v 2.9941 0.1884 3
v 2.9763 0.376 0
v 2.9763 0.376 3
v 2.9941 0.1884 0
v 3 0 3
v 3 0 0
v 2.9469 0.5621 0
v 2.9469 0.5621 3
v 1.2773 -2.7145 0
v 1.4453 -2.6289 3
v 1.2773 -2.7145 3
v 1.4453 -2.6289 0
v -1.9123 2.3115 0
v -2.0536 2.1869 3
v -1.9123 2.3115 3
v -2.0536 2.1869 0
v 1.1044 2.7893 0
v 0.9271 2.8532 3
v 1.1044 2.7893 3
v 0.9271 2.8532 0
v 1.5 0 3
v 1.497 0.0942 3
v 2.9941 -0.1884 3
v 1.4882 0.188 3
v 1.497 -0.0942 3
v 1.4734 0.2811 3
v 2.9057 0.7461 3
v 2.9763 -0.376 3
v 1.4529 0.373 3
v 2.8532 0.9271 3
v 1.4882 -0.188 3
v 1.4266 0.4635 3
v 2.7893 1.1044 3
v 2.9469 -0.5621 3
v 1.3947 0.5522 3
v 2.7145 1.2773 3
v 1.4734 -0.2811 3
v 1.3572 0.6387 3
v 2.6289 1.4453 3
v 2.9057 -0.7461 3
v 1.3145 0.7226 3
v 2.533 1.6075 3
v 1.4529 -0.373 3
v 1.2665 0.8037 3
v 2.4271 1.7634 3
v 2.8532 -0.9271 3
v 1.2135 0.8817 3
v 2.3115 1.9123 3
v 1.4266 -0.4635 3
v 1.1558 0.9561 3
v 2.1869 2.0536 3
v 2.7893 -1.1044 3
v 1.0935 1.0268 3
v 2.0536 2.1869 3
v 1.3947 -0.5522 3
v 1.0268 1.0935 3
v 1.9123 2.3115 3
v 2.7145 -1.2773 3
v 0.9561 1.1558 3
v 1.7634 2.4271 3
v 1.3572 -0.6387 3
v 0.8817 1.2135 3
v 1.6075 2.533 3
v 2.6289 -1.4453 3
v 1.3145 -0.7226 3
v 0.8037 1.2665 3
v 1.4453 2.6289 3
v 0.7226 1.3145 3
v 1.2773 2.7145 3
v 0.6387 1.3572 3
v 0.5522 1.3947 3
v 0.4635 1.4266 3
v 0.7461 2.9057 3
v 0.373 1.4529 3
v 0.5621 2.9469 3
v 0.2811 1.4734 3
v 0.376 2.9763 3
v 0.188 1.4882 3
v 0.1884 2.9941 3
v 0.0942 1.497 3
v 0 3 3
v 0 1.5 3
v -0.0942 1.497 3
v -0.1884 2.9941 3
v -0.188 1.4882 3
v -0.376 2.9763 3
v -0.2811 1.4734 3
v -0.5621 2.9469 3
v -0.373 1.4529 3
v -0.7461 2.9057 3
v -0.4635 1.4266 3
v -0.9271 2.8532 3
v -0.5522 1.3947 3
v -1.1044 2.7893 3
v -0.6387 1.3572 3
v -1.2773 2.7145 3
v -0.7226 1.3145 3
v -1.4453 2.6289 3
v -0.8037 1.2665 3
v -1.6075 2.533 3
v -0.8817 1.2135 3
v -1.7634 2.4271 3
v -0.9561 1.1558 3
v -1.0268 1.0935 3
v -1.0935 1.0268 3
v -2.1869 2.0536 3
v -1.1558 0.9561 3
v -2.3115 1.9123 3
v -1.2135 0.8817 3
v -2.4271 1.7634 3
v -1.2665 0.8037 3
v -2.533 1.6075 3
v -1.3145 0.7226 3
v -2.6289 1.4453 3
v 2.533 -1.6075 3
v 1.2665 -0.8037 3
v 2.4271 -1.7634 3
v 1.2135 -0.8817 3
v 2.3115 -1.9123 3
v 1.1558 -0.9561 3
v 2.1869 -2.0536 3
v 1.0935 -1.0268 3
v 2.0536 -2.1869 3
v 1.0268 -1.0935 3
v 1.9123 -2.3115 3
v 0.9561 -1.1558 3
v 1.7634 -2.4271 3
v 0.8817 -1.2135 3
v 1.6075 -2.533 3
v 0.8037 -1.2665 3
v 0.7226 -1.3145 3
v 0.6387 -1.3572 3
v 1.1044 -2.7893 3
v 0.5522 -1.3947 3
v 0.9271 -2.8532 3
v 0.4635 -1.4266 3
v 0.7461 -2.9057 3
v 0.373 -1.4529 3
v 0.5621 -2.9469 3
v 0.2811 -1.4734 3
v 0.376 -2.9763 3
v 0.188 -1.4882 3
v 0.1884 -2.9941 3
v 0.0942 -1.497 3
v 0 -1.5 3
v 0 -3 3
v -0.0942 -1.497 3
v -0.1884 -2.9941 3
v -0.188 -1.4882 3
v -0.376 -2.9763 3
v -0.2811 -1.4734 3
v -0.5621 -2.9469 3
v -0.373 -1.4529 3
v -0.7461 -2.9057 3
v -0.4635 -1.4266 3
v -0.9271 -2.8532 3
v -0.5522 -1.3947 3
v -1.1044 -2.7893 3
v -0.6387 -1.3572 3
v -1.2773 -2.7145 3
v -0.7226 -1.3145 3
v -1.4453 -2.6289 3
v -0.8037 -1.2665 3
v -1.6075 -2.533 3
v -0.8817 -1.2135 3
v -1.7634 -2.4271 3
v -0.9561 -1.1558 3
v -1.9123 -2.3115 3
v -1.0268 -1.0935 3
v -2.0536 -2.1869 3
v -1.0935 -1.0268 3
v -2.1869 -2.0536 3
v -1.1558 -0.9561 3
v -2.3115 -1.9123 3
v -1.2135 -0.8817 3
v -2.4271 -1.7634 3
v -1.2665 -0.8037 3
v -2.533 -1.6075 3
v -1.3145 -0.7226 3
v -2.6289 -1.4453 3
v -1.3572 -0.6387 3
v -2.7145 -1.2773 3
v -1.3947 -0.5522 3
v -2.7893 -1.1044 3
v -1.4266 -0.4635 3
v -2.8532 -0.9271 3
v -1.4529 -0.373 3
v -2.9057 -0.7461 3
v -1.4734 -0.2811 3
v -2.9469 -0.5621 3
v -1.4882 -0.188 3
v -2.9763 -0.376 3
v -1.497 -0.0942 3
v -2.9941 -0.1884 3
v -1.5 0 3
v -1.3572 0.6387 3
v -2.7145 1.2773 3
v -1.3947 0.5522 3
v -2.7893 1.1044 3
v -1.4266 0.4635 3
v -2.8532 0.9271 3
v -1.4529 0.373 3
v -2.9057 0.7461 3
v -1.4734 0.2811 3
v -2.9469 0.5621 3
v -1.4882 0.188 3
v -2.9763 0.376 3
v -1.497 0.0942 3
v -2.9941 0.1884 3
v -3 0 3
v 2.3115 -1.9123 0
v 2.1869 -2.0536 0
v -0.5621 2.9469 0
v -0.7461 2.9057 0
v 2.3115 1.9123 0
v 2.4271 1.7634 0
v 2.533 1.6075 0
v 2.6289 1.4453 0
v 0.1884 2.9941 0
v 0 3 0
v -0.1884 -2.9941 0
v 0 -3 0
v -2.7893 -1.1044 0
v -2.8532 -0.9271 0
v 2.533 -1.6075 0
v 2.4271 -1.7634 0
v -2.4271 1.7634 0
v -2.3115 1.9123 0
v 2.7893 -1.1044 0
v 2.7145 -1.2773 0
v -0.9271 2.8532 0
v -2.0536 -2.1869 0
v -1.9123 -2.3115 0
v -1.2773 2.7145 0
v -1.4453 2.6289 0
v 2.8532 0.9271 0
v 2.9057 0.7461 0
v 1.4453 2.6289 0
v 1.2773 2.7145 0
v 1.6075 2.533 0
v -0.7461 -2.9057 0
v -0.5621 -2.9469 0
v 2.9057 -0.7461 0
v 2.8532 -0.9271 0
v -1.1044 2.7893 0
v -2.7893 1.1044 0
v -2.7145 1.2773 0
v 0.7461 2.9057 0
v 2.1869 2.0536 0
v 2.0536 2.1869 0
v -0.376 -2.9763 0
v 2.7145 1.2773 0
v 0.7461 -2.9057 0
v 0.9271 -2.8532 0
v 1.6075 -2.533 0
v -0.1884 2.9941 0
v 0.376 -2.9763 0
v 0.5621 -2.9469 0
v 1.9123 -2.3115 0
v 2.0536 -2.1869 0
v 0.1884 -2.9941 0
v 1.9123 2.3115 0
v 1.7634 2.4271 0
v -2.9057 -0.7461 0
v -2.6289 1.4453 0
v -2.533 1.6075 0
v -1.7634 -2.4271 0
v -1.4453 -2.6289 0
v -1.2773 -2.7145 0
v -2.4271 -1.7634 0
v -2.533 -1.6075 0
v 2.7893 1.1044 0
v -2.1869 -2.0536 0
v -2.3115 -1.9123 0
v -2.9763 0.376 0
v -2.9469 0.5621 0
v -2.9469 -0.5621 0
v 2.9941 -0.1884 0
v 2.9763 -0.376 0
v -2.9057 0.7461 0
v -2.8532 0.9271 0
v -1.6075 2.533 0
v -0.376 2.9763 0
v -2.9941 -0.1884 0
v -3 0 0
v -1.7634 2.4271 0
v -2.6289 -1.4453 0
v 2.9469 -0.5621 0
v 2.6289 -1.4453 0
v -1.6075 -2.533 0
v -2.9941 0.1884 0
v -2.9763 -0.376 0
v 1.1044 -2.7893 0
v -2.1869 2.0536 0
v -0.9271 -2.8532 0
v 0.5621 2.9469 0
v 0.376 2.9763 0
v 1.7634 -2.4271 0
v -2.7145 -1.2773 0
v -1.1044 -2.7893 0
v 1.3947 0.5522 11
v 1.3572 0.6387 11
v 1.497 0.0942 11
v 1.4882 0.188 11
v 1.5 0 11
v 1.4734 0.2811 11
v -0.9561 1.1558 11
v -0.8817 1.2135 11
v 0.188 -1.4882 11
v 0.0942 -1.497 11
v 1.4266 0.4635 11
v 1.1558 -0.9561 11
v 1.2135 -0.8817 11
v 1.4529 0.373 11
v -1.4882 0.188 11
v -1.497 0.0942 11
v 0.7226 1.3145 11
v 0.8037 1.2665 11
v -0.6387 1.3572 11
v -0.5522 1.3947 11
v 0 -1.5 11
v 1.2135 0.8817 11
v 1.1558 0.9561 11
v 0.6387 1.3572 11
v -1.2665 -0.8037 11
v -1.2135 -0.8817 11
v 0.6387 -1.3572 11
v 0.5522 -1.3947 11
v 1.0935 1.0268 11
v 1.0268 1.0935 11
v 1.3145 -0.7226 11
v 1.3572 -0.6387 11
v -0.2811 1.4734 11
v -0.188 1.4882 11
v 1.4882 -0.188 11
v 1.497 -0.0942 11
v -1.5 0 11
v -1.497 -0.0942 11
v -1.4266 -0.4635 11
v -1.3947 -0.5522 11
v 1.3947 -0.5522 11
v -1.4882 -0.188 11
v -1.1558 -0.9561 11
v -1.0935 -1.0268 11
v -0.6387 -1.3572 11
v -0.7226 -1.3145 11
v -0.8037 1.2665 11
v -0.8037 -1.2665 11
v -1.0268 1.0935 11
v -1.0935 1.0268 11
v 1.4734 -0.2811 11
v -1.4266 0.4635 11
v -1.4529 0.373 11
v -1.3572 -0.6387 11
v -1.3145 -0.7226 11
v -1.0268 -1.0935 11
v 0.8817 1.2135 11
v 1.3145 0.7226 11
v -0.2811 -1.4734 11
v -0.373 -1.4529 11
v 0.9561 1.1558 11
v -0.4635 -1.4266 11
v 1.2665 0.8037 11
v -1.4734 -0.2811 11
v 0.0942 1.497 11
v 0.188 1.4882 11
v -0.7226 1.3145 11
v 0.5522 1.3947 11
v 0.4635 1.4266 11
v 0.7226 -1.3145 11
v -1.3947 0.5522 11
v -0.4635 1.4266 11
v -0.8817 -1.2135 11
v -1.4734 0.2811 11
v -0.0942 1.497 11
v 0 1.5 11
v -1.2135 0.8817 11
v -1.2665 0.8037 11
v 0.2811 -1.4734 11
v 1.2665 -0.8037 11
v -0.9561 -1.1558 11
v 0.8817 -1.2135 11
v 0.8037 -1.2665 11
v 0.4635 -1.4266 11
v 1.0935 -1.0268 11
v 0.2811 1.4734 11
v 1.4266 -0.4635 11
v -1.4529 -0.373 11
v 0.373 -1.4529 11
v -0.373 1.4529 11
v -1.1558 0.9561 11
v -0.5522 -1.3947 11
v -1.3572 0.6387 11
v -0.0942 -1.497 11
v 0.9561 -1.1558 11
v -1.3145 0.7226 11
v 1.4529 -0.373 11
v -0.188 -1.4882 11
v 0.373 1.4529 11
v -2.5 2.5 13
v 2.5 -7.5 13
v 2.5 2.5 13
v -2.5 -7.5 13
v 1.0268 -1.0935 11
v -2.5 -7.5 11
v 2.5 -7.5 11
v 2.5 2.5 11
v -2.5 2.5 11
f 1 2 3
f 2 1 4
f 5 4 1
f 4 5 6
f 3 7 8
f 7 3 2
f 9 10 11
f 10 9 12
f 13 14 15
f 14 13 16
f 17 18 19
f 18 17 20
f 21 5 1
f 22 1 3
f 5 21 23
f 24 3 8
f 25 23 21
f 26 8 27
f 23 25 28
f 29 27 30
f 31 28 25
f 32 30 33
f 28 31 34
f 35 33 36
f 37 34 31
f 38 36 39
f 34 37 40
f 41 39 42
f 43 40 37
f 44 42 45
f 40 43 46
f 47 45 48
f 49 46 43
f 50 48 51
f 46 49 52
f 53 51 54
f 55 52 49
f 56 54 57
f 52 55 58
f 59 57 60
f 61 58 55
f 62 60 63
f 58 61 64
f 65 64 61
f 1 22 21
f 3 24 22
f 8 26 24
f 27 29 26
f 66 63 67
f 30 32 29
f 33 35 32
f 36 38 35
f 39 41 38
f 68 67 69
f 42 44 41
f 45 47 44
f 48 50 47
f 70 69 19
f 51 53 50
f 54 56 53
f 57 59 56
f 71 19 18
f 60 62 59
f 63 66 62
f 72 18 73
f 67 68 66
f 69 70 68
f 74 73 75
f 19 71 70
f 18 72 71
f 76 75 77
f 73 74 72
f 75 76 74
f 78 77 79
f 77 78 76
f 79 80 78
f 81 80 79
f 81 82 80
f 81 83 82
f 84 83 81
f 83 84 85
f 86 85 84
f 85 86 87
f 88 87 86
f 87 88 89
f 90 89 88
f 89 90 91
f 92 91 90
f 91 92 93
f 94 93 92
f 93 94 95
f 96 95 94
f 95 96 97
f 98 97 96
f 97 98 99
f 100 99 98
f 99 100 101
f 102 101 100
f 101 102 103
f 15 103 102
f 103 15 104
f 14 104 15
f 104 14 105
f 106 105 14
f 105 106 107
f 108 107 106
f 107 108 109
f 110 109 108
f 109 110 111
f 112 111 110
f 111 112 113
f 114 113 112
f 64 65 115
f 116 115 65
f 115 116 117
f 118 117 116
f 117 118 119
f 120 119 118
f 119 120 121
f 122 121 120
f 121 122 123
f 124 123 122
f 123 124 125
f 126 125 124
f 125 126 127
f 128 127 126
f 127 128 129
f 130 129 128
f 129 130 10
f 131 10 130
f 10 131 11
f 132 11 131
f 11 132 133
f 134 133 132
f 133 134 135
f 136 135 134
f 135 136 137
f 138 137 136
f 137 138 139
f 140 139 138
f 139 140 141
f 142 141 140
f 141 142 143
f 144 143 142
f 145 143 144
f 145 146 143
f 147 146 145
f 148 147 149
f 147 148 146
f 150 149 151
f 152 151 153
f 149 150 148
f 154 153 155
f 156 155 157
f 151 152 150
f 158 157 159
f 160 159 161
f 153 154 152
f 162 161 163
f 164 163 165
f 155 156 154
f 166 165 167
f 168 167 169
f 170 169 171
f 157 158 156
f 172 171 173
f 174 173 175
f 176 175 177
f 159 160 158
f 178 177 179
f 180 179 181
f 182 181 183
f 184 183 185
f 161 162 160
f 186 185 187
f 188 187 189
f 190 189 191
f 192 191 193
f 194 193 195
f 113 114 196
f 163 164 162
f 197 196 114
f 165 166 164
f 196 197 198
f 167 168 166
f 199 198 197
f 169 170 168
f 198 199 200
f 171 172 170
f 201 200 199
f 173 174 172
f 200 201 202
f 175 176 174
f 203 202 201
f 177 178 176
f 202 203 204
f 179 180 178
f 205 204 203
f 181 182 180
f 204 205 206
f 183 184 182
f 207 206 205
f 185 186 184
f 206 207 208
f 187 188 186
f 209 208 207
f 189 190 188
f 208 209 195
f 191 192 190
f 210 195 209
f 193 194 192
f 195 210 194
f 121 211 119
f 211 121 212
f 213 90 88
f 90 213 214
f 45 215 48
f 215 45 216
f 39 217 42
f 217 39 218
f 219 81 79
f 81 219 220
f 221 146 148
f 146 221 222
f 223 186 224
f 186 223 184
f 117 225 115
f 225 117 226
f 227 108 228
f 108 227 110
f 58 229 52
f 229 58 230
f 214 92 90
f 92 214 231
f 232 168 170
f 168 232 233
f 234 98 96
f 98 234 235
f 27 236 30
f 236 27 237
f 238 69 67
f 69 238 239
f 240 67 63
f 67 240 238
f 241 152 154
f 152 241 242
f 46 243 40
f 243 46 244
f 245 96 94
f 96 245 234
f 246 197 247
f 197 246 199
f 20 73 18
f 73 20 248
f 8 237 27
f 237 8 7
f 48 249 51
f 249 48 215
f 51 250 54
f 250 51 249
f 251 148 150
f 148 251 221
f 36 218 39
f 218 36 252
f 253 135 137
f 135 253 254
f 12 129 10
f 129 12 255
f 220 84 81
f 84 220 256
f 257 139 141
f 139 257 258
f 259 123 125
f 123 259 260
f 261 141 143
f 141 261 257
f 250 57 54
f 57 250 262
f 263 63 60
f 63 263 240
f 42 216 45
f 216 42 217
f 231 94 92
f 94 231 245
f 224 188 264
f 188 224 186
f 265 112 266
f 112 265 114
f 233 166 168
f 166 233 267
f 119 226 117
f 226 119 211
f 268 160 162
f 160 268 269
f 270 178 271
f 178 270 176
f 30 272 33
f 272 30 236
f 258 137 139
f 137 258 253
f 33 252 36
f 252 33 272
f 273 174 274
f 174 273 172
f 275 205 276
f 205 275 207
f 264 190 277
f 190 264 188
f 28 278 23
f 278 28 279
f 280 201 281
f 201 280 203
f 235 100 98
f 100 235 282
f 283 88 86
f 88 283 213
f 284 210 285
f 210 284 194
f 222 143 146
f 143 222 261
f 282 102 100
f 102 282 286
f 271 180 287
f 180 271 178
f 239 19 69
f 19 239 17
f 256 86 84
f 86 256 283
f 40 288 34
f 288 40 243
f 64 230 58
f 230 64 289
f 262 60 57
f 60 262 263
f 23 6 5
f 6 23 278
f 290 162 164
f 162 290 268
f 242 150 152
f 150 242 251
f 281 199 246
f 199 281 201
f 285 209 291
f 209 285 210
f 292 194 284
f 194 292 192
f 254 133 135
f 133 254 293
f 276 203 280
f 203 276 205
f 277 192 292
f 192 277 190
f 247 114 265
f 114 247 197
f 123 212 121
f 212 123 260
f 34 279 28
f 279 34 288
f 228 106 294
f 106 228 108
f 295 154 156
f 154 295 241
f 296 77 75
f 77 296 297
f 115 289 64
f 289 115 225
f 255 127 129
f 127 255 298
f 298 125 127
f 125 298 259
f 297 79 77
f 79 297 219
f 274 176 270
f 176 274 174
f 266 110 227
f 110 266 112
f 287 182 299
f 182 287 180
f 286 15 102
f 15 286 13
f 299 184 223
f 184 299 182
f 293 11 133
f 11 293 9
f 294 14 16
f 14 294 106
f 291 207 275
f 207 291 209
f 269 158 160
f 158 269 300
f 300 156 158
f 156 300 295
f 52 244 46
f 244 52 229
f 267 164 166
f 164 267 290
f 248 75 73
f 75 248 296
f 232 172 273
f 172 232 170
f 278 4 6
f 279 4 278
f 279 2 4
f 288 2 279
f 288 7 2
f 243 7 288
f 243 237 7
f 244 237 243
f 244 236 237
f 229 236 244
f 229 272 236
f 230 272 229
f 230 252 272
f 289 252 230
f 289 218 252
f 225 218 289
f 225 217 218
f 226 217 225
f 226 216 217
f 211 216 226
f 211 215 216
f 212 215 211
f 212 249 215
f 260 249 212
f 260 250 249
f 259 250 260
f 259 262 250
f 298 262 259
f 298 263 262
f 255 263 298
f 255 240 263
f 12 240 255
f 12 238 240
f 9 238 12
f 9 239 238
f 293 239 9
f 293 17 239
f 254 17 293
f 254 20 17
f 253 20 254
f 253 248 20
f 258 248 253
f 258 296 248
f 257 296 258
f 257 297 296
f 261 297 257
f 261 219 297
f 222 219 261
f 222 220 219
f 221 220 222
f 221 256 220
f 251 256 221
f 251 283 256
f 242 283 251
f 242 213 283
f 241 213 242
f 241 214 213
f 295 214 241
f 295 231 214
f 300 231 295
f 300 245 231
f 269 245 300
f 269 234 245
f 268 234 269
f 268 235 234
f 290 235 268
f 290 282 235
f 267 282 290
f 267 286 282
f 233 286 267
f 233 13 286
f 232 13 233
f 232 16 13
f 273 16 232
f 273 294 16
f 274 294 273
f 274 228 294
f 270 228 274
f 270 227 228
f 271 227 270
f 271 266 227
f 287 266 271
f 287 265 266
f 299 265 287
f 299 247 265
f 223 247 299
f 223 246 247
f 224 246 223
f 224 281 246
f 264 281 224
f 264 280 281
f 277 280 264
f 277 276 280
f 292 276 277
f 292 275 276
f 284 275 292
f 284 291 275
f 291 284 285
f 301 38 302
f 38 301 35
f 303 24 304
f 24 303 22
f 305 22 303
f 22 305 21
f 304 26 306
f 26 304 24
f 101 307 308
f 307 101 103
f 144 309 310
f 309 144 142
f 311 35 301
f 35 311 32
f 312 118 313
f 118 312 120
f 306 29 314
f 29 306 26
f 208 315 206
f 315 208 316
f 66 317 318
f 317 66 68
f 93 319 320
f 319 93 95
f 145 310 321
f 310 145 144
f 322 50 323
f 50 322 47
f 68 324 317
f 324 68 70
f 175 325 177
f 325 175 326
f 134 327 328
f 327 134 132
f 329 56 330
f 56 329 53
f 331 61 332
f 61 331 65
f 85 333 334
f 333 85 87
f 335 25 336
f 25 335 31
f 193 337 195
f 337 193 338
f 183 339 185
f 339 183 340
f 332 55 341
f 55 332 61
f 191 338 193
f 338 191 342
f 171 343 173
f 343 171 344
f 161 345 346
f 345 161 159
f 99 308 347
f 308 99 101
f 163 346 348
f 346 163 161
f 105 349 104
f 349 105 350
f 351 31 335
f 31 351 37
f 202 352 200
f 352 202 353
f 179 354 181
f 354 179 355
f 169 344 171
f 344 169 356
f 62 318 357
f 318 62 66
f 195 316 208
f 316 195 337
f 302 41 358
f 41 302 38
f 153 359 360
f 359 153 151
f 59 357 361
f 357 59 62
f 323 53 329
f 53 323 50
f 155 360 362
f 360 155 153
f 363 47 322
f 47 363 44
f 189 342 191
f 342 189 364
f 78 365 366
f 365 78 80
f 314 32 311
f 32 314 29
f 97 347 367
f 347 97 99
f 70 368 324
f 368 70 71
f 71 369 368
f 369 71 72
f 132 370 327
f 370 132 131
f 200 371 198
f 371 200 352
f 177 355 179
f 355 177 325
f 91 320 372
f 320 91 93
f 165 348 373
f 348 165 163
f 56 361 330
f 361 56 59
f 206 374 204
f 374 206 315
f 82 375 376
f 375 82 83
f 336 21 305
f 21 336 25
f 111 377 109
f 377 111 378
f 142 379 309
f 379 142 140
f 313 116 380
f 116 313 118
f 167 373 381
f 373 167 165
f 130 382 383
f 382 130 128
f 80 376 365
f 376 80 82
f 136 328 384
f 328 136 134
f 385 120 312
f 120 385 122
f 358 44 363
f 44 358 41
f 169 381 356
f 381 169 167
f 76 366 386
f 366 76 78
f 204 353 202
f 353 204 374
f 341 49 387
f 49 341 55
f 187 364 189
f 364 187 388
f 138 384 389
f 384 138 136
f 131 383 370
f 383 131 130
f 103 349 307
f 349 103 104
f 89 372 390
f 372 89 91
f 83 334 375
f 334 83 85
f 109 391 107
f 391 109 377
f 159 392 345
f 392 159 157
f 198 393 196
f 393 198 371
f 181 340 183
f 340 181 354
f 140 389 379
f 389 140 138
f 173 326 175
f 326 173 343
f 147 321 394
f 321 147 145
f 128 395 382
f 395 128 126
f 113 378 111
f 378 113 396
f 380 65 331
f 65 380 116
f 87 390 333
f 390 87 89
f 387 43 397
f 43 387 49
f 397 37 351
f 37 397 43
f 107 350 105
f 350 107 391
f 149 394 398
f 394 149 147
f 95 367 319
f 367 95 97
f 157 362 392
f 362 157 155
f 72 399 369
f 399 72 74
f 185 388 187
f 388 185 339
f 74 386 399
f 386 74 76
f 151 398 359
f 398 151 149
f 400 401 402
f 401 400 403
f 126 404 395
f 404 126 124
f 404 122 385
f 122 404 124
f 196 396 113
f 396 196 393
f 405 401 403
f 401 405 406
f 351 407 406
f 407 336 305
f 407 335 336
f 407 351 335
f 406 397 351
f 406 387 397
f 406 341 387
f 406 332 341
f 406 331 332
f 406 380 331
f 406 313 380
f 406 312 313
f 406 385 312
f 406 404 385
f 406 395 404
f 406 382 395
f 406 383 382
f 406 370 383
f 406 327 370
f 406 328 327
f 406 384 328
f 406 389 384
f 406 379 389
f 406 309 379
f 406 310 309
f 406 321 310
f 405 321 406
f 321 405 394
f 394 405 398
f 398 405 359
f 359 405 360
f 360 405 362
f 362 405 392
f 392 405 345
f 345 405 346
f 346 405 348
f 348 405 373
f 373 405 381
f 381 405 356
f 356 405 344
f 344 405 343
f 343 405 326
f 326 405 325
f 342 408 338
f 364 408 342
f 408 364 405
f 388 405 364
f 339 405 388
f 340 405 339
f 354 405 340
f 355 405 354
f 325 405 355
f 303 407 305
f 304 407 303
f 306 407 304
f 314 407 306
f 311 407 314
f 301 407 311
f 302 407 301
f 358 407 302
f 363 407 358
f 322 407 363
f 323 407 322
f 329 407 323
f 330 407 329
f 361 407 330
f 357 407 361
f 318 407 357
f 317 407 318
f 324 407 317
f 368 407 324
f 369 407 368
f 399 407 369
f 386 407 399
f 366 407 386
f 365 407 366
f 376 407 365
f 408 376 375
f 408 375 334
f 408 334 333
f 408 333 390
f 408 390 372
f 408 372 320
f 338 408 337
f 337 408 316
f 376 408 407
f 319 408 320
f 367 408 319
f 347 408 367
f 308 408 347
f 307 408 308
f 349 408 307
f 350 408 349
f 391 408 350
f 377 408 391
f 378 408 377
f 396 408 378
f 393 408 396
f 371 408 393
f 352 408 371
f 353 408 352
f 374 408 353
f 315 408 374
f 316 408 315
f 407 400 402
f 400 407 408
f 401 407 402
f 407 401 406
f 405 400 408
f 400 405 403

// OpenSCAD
// file: nut.scad
// 1.5^2 + y^2 = 3^2
// sqrt(3^2 - 1.5^2)
//       30
//    /   |
// 60  - 90
// cos(30) = x / 3
// x = 3 cos(30)
module hex(side_length=3) {
  points = [[0,0], [side_length, 0], [side_length / 2, side_length * cos(30)]];
  for (i=[0:1:5]) {
    rotate([0,0,i * 60]) polygon(points);
  }
}

module hex_nut(side_length=3, height=2) {
    linear_extrude(height=height) hex(side_length);
}

module square_nut(side_length=5, height=2, _offset=0) {
    cube([5 + _offset,5,2]);
}
// file: screw.scad
$fn=100;

module screw(screw_head_radius=3, screw_head_height=3, threaded_radius=1.5, threaded_height=10) {
  // screw head
  cylinder(h=screw_head_height, r=screw_head_radius);

  translate([0, 0, screw_head_height]) {
    cylinder(h=threaded_height, r=threaded_radius);
  }
}

// m3x10

screw(screw_head_radius=3, screw_head_height=3, threaded_radius=1.5, threaded_height=10);
// main file
use <screw.scad>
use <nut.scad>

module screw_with_nut(
  hex_nut_height=2.5,
  screw_head_height=3,
  threaded_height=10,
  threaded_radius=1.5,
  screw_head_radius=3,
  hex_nut_side_length=3.6,
  square_nut_height=2,
  square_nut_side_length=5,
  nut_type="hex"
) {
  screw(screw_head_radius=screw_head_radius, screw_head_height=screw_head_height, threaded_radius=threaded_radius, threaded_height=threaded_height);

  if (nut_type == "hex") {
    translate([0,0, screw_head_height + threaded_height - hex_nut_height]) {
      hex_nut(side_length=hex_nut_side_length, height=hex_nut_height);
    }
  }

  else if (nut_type == "square"){
    rotate([0,0,-90])
    translate([
        -square_nut_side_length / 2,
        -square_nut_side_length / 2,
        screw_head_height + threaded_height - square_nut_height
    ]) {
      square_nut(
          side_length=square_nut_side_length,
          height=square_nut_height,
          _offset=5);
    }
  }

}

screw_with_nut(nut_type="square");
